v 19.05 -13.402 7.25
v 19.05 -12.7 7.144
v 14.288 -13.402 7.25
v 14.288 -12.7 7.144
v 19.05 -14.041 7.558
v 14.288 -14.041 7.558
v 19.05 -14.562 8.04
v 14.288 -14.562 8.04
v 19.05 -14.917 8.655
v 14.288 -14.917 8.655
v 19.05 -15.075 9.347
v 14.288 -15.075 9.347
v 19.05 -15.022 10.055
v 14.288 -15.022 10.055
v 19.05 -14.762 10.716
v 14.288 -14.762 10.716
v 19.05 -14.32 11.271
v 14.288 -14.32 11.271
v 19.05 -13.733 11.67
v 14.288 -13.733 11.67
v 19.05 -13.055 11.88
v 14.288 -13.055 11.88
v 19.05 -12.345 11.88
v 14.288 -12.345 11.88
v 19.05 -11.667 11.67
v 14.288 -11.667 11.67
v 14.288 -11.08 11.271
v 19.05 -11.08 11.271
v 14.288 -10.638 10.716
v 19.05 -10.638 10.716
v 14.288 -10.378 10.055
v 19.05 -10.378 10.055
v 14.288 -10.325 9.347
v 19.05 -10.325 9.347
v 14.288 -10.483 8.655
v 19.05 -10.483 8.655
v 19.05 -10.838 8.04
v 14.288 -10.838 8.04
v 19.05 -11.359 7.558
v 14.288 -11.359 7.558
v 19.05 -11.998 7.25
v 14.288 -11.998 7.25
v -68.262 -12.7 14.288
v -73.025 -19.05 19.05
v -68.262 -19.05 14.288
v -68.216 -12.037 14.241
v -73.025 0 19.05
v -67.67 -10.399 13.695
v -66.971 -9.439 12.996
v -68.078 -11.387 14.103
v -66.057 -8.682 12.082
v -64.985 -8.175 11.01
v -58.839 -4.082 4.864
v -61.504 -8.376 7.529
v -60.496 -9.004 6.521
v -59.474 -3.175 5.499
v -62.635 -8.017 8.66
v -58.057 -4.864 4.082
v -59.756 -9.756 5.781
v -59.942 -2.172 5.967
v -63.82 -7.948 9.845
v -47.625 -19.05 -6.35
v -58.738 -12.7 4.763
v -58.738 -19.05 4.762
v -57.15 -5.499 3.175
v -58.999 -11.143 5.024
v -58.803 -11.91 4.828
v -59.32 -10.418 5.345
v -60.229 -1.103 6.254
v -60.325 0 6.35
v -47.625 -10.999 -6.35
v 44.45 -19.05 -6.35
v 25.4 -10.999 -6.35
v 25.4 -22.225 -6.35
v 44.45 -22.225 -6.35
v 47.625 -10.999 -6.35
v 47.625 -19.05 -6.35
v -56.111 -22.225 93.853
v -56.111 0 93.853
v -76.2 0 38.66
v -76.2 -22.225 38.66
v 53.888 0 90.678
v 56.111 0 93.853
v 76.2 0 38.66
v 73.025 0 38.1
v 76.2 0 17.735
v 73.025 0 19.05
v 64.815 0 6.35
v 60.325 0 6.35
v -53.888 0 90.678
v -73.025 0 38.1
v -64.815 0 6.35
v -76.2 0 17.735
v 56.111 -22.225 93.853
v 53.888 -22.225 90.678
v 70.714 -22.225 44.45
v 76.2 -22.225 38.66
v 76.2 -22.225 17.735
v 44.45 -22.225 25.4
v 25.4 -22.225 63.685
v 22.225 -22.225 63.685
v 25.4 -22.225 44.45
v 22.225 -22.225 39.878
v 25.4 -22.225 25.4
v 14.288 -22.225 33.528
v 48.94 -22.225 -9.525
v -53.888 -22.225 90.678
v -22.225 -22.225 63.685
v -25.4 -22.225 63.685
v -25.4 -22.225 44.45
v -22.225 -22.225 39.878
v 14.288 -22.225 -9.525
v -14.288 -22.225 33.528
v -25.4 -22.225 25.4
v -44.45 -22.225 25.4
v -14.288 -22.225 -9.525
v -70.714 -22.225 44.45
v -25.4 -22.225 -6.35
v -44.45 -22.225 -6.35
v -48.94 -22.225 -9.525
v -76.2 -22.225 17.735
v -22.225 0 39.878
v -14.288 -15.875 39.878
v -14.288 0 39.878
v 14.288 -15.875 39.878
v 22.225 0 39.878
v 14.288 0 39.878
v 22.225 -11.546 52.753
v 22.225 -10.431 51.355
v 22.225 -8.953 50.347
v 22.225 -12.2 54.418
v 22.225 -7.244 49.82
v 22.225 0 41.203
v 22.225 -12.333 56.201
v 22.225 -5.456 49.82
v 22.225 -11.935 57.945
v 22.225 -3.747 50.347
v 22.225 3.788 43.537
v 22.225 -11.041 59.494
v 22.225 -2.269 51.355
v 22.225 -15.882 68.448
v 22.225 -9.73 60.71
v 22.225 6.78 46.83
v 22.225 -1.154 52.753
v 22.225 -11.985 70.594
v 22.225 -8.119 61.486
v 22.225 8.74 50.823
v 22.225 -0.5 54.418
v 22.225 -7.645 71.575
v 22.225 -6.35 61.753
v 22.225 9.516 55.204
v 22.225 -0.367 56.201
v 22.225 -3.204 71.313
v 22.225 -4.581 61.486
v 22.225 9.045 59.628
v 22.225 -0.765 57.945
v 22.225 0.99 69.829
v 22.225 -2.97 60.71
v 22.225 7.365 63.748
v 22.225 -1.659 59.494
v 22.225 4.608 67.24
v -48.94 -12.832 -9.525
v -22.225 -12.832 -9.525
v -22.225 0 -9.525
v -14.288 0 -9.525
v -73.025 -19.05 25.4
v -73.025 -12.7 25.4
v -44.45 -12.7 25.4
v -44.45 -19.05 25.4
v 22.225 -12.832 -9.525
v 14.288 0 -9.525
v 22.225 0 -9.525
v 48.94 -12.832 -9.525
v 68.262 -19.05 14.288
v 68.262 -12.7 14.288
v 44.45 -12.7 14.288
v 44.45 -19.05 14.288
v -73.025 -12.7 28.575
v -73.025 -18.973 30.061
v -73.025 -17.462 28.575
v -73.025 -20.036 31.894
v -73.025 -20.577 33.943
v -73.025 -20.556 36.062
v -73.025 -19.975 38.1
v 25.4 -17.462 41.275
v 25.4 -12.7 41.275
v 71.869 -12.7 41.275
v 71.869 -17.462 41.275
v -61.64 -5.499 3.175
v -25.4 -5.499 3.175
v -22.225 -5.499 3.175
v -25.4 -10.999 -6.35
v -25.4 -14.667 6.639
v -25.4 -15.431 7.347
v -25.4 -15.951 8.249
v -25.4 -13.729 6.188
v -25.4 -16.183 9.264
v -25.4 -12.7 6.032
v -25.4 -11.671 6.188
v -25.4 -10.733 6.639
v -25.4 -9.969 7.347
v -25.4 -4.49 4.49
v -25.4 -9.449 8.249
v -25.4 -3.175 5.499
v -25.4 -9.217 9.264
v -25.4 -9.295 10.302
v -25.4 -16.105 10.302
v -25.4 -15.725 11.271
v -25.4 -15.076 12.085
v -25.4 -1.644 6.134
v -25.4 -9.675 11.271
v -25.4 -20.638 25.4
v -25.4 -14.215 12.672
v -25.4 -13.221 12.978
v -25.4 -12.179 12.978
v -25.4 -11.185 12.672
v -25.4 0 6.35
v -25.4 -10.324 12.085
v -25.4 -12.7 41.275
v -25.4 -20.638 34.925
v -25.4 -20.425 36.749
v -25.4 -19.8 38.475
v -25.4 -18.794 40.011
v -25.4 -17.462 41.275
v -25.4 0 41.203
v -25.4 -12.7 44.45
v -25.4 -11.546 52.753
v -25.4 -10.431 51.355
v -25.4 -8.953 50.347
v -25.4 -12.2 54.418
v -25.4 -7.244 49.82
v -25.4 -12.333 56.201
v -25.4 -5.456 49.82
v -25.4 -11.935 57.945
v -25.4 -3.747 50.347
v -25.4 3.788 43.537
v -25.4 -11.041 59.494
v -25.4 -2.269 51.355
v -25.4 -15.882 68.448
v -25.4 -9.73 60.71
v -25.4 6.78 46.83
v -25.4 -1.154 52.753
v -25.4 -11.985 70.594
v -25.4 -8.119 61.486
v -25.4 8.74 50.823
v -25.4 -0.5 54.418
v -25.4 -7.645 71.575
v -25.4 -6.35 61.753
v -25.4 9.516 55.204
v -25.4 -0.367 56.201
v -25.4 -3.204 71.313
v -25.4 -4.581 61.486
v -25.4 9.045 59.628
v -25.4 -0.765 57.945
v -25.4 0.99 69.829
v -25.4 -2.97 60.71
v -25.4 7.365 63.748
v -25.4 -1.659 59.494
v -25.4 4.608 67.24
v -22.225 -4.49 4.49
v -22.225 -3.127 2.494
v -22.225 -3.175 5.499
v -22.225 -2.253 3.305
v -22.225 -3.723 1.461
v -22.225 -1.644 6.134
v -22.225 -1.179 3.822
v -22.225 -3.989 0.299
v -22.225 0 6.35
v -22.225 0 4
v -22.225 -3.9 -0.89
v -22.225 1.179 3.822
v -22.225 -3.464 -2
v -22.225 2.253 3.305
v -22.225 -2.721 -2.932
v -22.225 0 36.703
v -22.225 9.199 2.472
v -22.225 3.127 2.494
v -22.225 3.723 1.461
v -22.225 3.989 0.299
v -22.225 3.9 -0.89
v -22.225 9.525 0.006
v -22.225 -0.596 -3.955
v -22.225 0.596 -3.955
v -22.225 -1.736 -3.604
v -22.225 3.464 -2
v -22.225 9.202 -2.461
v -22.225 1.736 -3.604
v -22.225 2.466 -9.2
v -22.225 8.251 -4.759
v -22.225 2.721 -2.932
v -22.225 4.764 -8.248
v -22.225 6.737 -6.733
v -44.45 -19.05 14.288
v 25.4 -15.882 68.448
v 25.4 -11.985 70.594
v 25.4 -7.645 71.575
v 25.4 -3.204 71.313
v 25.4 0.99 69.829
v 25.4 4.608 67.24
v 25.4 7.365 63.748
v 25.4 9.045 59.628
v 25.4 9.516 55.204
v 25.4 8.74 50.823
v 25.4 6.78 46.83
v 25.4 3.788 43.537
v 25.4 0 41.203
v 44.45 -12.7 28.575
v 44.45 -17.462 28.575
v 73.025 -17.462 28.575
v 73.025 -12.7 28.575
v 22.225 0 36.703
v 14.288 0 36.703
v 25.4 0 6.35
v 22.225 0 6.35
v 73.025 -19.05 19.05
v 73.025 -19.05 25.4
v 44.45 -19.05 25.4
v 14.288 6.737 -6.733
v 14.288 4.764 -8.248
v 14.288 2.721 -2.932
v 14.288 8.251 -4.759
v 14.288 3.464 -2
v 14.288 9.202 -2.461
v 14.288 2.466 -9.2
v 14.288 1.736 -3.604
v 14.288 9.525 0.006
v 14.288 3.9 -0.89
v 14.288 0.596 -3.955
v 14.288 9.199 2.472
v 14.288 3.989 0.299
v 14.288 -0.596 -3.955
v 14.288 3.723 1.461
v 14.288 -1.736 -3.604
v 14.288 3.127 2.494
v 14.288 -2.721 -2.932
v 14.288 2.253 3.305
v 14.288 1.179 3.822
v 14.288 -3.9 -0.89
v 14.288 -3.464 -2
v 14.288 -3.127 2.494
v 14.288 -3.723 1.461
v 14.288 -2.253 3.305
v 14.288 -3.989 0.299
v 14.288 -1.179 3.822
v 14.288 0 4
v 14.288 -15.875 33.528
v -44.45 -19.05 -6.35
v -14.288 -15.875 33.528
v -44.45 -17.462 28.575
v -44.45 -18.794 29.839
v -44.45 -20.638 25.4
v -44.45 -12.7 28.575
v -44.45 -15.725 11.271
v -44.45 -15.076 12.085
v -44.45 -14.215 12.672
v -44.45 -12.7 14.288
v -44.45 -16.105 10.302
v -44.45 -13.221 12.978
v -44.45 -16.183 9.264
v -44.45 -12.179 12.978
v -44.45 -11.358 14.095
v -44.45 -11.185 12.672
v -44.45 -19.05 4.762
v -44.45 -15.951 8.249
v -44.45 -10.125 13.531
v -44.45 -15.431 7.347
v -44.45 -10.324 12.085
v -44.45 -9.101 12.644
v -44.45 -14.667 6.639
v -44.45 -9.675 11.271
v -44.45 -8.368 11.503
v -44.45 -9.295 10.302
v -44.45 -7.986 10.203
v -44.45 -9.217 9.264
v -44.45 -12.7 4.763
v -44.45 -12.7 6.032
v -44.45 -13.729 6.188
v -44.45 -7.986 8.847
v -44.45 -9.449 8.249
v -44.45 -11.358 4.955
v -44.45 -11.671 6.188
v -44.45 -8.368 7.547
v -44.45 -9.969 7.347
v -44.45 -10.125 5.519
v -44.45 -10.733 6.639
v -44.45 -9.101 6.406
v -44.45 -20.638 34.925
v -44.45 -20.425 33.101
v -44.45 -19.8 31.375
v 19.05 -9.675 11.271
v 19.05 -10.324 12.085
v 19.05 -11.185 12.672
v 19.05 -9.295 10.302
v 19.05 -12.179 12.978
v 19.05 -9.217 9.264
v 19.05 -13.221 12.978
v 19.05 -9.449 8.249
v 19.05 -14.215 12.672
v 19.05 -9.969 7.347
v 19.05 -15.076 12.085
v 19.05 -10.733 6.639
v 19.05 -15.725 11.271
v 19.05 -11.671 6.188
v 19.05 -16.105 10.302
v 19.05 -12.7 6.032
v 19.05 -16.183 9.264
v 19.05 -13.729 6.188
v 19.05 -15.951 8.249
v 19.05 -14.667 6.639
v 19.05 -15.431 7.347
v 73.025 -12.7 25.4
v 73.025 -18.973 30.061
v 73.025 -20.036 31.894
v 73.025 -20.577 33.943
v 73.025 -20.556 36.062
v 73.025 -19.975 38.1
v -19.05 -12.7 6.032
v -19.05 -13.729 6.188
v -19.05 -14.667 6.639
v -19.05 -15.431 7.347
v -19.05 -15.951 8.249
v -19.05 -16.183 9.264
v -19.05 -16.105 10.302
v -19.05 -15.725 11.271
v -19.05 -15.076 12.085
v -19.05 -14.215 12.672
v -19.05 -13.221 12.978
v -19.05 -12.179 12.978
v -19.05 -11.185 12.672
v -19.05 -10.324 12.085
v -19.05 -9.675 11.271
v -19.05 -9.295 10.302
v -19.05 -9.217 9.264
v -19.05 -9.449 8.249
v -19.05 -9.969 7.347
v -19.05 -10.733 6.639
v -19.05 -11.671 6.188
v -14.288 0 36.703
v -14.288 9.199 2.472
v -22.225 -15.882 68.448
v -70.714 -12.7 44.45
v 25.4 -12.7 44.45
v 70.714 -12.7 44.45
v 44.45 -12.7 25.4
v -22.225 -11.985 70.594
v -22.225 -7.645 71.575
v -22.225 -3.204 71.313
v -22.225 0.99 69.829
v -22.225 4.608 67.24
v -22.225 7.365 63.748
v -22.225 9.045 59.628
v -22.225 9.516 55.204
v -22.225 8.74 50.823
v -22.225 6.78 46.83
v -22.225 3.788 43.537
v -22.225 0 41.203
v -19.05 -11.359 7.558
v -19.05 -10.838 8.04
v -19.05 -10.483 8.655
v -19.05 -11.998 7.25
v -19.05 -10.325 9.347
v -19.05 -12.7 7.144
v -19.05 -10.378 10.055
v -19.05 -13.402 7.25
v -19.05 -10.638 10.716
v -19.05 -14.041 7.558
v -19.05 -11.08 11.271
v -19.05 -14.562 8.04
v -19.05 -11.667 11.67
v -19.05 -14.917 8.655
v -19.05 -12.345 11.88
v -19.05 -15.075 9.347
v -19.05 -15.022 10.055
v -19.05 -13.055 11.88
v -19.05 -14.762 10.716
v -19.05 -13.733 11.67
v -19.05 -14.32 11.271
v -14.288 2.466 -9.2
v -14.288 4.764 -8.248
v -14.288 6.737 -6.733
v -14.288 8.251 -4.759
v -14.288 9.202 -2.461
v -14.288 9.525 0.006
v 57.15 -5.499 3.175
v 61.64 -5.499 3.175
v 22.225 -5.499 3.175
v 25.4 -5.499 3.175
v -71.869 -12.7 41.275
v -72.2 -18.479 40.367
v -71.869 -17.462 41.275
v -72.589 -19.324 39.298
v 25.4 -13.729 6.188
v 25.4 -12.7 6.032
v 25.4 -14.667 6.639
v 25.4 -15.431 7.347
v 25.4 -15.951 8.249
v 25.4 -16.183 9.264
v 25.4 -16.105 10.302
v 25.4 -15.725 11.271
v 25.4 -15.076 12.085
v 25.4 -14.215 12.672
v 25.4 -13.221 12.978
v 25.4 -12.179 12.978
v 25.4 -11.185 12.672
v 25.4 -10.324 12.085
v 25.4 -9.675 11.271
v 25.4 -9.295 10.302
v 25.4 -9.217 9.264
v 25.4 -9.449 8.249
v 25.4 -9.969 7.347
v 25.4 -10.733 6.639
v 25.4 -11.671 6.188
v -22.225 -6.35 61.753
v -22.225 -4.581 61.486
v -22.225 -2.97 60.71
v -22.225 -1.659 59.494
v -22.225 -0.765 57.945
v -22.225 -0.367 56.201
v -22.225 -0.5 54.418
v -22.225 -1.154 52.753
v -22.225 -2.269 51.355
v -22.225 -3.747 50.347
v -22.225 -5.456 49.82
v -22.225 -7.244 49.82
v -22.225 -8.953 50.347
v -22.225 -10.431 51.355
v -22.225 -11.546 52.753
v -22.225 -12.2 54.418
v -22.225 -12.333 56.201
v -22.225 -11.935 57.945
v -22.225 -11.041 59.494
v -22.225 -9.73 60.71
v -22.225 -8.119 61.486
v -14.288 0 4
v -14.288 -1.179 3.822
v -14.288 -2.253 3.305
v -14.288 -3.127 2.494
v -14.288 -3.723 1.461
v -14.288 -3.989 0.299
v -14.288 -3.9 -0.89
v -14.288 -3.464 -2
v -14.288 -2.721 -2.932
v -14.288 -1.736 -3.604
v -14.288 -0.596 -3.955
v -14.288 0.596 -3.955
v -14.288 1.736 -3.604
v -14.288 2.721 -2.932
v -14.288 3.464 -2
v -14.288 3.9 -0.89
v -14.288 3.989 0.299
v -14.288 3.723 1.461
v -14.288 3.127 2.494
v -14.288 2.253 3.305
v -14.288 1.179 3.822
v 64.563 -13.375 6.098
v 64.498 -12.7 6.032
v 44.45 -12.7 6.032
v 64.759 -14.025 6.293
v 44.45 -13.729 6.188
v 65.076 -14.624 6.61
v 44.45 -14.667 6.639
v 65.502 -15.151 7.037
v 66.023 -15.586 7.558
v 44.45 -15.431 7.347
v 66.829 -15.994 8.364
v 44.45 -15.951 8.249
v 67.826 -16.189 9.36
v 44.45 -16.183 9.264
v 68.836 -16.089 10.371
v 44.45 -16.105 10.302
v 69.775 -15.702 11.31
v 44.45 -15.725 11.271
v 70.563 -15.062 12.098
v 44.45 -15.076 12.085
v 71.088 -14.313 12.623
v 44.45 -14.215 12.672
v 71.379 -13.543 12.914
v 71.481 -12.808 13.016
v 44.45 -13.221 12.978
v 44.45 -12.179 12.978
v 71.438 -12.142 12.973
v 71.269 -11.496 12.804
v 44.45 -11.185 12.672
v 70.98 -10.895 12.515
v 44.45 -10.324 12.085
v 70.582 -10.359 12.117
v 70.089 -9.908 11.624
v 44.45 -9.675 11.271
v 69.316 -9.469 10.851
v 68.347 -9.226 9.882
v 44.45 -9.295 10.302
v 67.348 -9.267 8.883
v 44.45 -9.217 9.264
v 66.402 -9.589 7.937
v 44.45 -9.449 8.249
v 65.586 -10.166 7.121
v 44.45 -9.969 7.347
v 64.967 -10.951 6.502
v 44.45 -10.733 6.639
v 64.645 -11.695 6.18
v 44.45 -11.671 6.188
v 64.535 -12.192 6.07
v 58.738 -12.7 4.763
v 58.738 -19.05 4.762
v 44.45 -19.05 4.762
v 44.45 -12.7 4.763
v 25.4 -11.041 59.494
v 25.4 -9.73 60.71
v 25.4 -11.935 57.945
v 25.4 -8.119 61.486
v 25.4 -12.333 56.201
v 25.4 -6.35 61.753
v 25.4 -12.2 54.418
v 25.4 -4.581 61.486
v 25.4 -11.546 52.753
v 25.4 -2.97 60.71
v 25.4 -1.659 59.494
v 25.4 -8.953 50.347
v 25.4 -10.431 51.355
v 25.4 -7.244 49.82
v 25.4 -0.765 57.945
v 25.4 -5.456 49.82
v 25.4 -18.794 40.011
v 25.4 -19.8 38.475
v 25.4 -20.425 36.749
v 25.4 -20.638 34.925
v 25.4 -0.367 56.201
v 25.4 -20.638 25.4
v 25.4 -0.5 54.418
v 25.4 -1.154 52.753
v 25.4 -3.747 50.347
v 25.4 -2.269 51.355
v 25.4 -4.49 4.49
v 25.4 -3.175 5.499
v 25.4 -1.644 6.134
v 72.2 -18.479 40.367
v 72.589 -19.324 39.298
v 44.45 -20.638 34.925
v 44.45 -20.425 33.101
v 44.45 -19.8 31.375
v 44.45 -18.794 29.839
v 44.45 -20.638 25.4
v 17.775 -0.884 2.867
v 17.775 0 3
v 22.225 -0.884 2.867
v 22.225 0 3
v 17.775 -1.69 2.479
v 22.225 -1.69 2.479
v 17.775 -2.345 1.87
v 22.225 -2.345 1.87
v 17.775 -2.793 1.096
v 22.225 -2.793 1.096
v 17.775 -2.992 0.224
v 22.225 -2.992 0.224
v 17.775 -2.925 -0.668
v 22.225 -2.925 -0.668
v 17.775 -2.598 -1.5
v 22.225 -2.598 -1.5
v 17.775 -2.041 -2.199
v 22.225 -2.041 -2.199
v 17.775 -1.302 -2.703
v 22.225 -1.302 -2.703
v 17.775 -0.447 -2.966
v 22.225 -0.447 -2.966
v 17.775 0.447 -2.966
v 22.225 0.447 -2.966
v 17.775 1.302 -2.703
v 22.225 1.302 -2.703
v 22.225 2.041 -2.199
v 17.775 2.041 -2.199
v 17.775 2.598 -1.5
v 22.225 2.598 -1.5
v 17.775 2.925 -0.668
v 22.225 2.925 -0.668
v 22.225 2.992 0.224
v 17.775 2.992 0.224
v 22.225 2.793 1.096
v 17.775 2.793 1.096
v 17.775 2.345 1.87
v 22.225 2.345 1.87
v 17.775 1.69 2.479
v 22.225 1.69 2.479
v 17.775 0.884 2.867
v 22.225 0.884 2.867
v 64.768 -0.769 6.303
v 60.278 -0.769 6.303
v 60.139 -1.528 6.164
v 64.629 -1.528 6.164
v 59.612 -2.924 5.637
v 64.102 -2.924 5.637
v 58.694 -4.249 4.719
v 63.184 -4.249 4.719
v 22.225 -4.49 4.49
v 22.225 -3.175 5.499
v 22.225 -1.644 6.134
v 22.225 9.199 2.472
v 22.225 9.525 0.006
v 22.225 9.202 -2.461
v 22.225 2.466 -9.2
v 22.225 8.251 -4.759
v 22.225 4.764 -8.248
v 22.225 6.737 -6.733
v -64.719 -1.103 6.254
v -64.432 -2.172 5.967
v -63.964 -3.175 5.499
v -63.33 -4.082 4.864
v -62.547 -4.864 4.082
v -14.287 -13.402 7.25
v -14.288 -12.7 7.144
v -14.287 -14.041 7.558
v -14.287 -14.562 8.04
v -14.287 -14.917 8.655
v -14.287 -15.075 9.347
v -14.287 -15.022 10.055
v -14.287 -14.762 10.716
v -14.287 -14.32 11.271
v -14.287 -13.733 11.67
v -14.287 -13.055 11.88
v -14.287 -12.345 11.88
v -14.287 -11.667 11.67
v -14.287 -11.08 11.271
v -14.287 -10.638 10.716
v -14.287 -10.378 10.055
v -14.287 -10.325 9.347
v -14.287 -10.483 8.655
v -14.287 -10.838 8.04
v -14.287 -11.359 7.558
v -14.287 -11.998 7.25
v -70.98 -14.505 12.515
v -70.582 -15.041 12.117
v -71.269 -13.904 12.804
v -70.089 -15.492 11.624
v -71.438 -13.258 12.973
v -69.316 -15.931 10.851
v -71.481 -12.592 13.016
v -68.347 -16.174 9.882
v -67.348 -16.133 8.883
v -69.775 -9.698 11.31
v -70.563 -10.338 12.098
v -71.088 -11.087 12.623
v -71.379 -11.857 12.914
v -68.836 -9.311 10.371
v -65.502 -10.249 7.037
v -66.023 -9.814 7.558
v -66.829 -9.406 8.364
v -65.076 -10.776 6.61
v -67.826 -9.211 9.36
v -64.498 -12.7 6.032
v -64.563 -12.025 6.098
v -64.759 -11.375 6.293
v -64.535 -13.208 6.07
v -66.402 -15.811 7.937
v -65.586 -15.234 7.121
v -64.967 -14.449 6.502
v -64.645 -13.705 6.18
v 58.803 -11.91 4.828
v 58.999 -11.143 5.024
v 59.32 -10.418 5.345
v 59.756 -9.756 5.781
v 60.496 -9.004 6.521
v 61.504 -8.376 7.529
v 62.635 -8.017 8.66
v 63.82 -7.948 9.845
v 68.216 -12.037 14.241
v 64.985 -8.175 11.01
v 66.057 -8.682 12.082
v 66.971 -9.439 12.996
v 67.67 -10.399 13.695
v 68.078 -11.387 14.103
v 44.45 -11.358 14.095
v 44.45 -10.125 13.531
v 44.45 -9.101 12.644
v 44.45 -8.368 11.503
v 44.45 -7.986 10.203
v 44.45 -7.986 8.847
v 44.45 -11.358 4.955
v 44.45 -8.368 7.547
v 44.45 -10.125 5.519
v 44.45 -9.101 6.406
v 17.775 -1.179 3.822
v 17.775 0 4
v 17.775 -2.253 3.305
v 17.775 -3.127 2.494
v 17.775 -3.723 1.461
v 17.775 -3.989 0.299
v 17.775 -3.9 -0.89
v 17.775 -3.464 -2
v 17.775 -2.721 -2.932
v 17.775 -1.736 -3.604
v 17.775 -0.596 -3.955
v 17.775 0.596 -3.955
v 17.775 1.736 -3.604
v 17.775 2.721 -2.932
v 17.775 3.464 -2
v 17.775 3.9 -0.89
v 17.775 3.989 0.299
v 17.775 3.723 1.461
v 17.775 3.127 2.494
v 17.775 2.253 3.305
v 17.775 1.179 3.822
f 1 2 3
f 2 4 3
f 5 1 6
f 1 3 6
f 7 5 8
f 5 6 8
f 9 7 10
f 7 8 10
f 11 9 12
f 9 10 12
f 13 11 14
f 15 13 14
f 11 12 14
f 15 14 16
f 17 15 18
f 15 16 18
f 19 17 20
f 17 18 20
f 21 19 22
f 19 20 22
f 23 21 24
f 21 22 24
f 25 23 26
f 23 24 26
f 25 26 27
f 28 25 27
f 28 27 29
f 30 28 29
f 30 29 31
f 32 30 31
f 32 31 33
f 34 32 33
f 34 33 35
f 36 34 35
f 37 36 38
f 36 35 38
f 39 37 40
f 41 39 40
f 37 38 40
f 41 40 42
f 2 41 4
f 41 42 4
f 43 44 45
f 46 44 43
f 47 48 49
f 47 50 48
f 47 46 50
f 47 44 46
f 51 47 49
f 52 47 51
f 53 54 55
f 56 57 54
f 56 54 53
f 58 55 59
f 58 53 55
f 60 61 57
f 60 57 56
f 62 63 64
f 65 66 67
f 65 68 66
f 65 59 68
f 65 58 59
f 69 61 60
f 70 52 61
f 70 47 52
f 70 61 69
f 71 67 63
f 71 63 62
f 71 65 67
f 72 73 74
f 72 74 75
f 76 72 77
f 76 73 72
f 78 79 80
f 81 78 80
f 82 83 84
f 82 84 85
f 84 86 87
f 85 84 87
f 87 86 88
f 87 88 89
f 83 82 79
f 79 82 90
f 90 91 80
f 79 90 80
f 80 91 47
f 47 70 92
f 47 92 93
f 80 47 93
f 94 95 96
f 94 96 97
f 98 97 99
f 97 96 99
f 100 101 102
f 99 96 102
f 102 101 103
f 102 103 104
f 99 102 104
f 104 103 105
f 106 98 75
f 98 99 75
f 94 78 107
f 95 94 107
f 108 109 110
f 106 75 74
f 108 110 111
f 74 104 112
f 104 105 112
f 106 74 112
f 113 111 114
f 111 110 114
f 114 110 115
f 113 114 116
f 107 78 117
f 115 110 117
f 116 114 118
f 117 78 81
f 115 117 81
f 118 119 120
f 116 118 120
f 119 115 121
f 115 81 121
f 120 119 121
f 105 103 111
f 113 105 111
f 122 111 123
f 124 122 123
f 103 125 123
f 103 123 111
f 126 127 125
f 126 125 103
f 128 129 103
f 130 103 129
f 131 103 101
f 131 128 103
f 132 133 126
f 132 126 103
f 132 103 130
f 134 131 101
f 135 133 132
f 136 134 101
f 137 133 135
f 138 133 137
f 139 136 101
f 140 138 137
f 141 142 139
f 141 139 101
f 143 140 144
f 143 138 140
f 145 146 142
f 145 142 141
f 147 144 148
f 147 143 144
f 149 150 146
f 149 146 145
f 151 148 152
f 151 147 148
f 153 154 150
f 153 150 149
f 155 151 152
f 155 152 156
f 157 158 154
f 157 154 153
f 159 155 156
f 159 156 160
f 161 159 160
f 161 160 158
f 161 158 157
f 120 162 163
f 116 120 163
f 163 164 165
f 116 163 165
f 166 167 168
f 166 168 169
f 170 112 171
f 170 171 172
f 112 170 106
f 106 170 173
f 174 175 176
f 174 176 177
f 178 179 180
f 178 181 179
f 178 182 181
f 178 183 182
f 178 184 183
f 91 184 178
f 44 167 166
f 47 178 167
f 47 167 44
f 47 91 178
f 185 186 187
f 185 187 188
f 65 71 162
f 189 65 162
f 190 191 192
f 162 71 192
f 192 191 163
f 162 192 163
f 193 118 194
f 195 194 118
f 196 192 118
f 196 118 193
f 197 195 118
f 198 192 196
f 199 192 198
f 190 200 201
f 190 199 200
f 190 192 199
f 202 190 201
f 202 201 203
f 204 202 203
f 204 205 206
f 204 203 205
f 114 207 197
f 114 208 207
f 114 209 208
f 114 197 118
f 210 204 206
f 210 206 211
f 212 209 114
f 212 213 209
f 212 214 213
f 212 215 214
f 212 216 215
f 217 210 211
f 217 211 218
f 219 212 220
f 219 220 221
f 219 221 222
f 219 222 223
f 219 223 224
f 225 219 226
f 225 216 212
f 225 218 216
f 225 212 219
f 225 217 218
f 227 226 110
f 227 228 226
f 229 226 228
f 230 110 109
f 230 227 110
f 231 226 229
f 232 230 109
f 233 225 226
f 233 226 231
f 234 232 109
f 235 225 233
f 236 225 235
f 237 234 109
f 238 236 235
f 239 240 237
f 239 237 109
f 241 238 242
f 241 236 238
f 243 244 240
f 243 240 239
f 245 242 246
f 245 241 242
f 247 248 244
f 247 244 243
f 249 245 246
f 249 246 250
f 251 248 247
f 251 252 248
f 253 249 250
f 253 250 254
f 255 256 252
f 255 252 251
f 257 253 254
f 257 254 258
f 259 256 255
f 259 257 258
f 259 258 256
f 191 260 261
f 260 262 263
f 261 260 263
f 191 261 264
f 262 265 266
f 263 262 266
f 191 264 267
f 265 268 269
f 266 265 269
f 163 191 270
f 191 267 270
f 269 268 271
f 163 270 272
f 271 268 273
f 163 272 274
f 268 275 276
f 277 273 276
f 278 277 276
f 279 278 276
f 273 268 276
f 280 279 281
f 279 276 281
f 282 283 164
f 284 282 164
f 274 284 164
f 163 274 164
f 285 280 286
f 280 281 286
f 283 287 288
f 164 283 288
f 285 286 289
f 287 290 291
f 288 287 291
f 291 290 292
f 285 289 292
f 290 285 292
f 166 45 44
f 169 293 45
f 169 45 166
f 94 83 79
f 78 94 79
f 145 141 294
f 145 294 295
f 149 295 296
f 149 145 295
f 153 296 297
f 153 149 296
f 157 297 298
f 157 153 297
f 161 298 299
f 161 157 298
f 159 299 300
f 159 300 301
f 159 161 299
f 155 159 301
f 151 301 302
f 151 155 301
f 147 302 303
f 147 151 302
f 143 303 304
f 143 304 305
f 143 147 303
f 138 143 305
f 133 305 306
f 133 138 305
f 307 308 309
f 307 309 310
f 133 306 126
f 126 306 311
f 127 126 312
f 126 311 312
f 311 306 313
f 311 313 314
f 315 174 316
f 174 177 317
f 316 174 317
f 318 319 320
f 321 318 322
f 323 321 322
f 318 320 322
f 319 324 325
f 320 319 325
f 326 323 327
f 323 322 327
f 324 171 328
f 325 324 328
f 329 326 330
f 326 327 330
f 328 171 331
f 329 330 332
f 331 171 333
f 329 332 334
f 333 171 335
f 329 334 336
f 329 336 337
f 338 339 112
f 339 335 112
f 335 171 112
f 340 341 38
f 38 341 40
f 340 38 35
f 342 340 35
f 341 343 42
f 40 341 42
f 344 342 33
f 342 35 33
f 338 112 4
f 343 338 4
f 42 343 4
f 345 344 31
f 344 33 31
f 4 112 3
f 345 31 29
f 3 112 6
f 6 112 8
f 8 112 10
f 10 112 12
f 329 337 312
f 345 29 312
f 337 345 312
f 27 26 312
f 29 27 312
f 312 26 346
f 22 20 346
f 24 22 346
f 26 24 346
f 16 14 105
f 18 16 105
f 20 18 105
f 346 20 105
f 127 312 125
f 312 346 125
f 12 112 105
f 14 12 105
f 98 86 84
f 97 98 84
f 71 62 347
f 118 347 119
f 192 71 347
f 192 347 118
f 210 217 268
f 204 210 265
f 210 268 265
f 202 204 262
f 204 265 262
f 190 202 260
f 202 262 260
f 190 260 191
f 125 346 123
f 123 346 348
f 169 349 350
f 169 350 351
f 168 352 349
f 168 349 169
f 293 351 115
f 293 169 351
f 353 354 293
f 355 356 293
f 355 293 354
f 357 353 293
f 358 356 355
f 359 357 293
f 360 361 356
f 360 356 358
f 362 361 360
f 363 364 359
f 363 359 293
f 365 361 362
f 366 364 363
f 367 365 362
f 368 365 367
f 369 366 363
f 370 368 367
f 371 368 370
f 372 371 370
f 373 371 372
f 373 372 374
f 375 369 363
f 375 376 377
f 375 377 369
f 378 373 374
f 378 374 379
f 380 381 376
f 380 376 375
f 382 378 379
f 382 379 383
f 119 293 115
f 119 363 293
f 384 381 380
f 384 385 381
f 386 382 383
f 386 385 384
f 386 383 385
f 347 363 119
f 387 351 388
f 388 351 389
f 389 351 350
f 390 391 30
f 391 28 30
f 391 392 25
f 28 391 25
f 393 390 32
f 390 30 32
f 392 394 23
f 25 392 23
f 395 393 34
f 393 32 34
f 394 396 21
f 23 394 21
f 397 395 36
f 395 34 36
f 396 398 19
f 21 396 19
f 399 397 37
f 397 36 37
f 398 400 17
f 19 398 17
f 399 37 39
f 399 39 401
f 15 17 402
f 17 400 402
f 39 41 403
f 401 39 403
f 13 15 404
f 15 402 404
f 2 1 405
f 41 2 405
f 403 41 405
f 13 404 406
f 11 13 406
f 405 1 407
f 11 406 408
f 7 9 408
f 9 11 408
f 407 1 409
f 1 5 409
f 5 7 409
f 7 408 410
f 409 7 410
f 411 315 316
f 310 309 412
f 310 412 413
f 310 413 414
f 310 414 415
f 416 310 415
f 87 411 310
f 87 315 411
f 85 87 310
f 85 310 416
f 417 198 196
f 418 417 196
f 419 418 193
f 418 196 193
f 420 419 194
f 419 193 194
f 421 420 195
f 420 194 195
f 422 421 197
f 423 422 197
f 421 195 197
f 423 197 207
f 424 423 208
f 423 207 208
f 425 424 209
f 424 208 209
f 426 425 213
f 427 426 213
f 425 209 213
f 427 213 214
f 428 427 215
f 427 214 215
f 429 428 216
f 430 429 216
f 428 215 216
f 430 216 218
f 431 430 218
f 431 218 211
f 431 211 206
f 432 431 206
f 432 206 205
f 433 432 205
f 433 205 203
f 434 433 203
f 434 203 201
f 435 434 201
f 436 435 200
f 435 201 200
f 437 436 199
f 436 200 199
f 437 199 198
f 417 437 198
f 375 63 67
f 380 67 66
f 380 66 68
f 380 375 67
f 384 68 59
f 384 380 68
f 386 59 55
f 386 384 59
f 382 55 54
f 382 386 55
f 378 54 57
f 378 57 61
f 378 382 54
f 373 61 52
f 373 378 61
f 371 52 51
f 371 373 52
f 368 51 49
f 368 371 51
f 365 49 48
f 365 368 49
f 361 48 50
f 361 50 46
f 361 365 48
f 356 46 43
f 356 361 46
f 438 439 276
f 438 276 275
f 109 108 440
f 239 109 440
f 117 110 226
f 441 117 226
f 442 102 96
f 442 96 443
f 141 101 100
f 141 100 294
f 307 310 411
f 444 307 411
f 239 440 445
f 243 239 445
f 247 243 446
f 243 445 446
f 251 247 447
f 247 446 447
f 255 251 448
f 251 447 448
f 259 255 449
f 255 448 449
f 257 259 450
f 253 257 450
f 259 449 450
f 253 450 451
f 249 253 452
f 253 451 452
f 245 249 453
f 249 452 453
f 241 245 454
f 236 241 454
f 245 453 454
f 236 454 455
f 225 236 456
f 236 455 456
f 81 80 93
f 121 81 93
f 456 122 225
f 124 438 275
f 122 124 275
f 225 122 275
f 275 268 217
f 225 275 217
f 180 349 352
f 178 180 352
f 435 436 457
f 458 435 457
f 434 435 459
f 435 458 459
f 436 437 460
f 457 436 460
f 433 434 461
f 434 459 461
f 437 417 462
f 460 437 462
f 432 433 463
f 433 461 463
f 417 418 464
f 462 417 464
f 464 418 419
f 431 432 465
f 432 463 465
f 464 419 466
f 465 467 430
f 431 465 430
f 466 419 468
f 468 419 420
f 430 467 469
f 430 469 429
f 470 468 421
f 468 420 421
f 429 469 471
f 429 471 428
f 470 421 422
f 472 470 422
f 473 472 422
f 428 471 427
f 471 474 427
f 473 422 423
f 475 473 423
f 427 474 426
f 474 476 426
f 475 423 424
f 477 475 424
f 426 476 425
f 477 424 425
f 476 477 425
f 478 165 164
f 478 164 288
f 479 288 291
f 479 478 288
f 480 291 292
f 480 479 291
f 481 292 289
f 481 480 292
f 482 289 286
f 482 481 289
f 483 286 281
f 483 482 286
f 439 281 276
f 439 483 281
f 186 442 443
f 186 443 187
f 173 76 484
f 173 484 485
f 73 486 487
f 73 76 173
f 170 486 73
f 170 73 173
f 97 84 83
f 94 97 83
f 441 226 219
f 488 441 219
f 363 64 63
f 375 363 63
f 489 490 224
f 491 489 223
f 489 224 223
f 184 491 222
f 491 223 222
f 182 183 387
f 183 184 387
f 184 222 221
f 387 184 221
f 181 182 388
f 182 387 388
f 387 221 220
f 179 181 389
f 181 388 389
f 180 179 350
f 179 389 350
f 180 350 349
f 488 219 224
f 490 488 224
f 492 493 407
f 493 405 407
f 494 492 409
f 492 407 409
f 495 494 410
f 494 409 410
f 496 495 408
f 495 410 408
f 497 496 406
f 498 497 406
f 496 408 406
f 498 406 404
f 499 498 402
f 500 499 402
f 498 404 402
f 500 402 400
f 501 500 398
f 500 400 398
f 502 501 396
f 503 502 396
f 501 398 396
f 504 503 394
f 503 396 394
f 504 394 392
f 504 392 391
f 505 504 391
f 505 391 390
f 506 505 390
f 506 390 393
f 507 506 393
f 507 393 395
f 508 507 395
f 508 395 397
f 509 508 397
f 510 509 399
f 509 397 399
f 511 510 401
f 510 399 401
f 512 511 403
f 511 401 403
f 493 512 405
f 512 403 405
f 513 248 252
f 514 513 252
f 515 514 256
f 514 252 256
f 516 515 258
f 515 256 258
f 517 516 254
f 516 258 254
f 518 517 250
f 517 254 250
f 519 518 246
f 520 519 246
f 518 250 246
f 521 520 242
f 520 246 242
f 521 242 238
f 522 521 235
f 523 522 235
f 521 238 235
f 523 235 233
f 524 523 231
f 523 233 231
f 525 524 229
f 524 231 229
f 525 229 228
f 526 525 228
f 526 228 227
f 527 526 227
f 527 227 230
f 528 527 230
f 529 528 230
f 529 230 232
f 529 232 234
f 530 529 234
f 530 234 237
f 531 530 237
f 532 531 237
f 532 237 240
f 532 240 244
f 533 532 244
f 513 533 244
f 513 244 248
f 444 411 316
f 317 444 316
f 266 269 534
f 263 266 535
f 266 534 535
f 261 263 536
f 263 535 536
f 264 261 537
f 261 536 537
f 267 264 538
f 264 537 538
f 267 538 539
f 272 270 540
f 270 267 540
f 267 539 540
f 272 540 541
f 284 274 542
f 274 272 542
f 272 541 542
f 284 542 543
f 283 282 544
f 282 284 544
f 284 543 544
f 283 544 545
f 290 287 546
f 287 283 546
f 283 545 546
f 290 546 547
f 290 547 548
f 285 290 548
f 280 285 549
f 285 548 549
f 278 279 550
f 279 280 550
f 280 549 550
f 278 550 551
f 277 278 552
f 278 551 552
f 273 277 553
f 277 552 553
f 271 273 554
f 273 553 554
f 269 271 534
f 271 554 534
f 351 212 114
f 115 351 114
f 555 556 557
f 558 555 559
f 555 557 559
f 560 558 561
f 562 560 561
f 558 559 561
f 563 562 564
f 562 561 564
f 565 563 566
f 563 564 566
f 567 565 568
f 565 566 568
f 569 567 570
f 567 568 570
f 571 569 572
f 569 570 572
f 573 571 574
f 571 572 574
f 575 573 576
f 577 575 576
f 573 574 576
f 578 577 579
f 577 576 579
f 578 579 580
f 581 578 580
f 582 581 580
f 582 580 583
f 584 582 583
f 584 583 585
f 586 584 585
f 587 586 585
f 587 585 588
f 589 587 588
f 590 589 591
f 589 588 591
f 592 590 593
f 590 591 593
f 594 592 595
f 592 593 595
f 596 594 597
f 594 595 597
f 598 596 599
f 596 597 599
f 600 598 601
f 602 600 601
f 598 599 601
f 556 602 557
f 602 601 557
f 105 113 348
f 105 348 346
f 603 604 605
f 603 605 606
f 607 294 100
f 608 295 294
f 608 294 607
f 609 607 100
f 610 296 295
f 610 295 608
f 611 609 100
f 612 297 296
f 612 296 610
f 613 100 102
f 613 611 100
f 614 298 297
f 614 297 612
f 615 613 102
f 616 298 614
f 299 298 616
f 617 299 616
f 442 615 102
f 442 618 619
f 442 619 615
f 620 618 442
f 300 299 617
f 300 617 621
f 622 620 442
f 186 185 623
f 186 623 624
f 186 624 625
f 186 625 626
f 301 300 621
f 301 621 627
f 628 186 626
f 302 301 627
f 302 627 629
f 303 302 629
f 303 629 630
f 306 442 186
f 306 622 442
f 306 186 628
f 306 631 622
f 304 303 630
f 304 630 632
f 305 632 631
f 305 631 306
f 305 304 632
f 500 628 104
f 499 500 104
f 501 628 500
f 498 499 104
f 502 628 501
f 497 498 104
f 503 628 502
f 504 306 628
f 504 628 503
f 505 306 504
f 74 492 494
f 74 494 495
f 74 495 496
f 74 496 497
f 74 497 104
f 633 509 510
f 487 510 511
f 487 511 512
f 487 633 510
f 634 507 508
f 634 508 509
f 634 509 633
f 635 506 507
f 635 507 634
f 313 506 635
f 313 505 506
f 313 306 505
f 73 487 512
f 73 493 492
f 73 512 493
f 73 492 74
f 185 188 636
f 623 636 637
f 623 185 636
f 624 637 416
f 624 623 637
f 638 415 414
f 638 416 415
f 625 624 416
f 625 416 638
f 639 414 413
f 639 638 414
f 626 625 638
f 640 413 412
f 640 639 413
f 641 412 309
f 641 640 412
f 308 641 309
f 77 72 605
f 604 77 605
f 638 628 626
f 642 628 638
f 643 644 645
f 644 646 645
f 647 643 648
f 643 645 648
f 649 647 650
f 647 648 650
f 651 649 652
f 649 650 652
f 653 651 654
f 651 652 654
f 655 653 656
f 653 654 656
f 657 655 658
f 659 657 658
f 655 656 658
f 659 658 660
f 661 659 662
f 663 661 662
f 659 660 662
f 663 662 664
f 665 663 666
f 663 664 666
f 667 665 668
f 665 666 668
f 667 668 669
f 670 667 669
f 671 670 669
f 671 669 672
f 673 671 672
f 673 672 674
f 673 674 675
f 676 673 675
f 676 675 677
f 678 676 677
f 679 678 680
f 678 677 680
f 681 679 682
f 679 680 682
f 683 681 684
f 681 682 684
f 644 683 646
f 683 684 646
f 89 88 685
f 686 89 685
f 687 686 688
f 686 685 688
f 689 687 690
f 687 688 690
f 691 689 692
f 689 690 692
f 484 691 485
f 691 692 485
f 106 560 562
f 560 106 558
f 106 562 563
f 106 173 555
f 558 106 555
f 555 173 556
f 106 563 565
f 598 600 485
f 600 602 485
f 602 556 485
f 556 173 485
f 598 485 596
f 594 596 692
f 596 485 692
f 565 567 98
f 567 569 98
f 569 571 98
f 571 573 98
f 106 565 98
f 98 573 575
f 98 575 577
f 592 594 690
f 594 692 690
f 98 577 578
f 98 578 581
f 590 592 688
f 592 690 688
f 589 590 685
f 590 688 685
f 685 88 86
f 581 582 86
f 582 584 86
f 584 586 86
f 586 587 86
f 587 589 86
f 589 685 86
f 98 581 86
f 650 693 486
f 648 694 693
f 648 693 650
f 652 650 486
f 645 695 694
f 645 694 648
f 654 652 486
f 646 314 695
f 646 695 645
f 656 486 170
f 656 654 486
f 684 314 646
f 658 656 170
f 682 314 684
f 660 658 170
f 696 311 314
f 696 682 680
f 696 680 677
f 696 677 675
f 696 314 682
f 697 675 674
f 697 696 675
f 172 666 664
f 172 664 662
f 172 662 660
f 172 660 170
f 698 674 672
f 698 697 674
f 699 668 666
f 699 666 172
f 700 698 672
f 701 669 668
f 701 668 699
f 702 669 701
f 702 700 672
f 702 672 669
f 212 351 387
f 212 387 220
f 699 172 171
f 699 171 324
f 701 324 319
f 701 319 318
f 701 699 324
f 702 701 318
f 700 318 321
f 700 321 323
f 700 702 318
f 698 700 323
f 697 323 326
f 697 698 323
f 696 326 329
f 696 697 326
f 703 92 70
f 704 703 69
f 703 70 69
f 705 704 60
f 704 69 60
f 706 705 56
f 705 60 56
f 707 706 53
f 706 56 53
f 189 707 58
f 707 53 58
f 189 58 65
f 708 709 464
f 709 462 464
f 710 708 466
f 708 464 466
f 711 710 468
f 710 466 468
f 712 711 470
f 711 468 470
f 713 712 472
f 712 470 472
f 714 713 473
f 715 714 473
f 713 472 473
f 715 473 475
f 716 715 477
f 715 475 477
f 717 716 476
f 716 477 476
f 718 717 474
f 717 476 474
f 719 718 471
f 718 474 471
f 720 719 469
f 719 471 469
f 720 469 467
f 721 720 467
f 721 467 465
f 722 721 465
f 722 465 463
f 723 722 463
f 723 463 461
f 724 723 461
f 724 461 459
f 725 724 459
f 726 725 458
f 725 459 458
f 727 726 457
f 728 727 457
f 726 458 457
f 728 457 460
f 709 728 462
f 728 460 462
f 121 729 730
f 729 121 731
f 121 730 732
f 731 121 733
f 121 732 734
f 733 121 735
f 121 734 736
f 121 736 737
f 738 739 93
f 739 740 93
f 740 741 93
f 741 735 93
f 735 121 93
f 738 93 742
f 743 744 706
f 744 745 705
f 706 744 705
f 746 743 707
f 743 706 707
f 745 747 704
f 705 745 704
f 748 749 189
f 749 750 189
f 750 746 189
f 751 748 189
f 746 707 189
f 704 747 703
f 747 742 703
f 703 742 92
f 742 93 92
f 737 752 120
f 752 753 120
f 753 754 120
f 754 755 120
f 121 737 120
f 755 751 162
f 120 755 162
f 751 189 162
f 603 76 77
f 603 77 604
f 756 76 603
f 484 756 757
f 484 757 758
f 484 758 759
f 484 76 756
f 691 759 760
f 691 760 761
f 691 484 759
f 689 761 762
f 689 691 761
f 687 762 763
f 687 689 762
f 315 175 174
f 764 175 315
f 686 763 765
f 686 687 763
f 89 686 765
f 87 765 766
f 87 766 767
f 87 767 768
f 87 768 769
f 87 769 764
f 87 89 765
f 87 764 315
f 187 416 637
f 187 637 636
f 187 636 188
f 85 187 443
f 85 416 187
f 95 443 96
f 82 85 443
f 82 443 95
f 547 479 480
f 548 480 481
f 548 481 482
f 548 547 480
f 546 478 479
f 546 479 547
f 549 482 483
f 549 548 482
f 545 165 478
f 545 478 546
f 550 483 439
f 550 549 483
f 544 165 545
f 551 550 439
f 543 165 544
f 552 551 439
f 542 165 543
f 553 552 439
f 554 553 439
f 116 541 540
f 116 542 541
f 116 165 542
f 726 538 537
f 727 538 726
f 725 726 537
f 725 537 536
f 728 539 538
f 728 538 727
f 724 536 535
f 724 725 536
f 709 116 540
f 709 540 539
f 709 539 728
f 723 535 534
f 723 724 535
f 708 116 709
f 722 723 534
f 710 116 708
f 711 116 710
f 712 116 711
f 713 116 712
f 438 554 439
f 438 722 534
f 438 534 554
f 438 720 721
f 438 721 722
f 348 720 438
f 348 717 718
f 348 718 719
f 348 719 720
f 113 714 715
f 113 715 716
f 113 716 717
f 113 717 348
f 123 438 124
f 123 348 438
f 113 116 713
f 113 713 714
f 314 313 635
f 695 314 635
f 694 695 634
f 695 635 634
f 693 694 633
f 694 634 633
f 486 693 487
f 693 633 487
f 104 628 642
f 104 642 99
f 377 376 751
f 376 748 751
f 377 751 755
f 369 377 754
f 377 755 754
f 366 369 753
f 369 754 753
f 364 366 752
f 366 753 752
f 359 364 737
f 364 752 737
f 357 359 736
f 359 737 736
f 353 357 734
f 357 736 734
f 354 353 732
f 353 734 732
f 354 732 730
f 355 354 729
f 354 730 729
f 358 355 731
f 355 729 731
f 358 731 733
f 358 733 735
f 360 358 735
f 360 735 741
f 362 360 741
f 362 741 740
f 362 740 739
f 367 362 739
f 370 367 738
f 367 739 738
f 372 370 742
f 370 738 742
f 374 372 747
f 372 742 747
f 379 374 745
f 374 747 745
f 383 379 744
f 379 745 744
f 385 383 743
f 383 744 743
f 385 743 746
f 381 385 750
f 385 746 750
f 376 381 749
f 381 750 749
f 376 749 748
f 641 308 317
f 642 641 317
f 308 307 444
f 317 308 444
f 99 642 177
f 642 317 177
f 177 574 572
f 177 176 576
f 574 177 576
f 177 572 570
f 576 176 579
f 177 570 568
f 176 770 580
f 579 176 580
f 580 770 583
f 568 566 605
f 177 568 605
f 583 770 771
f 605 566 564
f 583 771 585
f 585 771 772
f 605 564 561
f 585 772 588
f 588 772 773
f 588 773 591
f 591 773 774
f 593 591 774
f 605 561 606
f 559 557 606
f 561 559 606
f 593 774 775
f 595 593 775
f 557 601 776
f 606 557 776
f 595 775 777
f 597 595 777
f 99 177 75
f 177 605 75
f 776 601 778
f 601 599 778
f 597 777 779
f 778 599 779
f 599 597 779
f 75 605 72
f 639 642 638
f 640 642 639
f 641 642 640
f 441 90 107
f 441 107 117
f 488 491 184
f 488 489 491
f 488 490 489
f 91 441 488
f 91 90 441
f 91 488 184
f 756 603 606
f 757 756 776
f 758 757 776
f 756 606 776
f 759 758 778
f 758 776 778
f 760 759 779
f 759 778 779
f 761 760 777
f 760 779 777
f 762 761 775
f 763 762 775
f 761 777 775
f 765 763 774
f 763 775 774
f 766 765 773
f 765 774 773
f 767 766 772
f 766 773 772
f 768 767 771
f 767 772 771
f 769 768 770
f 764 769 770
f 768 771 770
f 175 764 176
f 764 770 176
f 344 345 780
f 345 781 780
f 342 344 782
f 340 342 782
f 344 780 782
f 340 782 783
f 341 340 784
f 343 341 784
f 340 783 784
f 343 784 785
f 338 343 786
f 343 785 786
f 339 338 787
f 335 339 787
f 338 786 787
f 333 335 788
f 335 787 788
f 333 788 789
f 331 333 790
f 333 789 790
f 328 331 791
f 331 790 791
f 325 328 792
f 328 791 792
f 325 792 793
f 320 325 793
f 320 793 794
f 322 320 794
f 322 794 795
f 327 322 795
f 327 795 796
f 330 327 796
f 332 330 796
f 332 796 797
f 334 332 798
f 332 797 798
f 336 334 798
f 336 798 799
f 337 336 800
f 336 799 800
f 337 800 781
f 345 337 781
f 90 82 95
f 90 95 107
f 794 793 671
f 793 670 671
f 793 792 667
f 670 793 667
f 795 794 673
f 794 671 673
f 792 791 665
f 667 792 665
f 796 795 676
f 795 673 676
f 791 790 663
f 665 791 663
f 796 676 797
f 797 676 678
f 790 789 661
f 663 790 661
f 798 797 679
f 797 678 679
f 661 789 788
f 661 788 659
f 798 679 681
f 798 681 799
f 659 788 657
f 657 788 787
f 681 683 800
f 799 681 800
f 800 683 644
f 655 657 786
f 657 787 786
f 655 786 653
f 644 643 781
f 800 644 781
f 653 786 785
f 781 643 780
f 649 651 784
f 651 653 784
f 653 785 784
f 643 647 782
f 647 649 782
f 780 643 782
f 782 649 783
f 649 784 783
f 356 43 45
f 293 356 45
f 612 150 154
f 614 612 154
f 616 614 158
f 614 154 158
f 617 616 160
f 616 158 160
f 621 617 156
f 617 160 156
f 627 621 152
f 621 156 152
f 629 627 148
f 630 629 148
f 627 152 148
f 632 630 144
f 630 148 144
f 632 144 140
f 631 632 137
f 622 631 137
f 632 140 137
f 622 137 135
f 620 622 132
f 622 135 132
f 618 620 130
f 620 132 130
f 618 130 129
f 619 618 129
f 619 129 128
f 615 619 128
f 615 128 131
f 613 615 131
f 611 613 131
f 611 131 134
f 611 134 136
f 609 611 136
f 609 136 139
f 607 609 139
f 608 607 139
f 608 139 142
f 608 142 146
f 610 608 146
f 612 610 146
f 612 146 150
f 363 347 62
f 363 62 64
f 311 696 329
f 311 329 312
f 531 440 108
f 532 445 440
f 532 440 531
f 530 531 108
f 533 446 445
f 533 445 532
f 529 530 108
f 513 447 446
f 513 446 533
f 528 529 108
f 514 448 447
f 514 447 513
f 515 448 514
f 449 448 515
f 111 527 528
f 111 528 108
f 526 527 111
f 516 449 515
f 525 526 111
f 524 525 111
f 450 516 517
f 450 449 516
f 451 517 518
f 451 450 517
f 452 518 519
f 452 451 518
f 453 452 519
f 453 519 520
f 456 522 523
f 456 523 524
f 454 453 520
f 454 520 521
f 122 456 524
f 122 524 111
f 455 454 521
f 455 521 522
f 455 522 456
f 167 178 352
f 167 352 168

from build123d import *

# Parameters (mm, degrees)
BOSS_EXTRUDE1_DEPTH = 22.225
BOSS_EXTRUDE2_DEPTH = 22.225
SKETCH4_W           = 28.575
SKETCH4_H           = 43.053
CUT_EXTRUDE1_DEPTH  = 125.991552151
CUT_EXTRUDE4_REACH  = 101.697
SKETCH9_W           = 28.575
SKETCH9_H           = 16.728193257
BOSS_EXTRUDE3_REACH = 142.089
SKETCH11_W          = 19.05
SKETCH11_H          = 19.05
CUT_EXTRUDE5_DEPTH  = 7.9375
BOSS_EXTRUDE6_REACH = 156.463
BOSS_EXTRUDE4_DEPTH = 3.175
CUT_EXTRUDE6_REACH  = 142.089
SKETCH19_R          = 6
CUT_EXTRUDE7_DEPTH  = 138.803544436


with BuildPart() as part:
    # Sketch1 → Boss-Extrude1 (new, symmetric)
    with BuildSketch(Plane(origin=(0, 0, 0), x_dir=(0, 0, -1), z_dir=(1, 0, 0))):
        with BuildLine():
            Line((9.525, -22.225), (9.525, 0))
            ThreePointArc((9.525, 0), (5.795727419, 7.558780899), (-2.471885813, 9.198663247))
            Line((-2.471885813, 9.198663247), (-36.703, 0))
            Line((-36.703, 0), (-36.703, -22.225))
            Line((-36.703, -22.225), (9.525, -22.225))
        make_face()
    extrude(amount=BOSS_EXTRUDE1_DEPTH, both=True)

    # Sketch3 → Boss-Extrude2 (add)
    with BuildSketch(Plane(origin=(0, 0, 0), x_dir=(-1, 0, 0), z_dir=(0, -1, 0))):
        Polygon((22.225, 9.525), (22.225, -36.703), (-22.225, -36.703), (-22.225, 9.525), (-48.940128061, 9.525), (-76.2, -17.734871939), (-76.2, -38.659838164), (-56.111331957, -93.853), (56.111331957, -93.853), (76.2, -38.659838164), (76.2, -17.734871939), (48.940128061, 9.525), align=None)
        Polygon((73.025, -19.05), (47.625, 6.35), (25.4, 6.35), (25.4, -49.403), (22.225, -49.403), (22.225, -39.878), (-22.225, -39.878), (-22.225, -49.403), (-25.4, -49.403), (-25.4, 6.35), (-47.625, 6.35), (-73.025, -19.05), (-73.025, -38.1), (-53.888173023, -90.678), (53.888173023, -90.678), (73.025, -38.1), align=None, mode=Mode.SUBTRACT)
    extrude(amount=BOSS_EXTRUDE2_DEPTH)

    # Sketch4 → Cut-Extrude1 (cut, through all)
    with BuildSketch(Plane.XZ.offset(22.225)):
        with Locations((0, 12.0015)):
            Rectangle(SKETCH4_W, SKETCH4_H)
    extrude(amount=-CUT_EXTRUDE1_DEPTH, mode=Mode.SUBTRACT)

    # Sketch6 → Cut-Revolve1 (revolve, cut)
    with BuildSketch(Plane(origin=(0, 0, 0), x_dir=(1, 0, 0), z_dir=(0, 1, 0)), mode=Mode.PRIVATE) as cut_revolve1_sk:
        Polygon((-22.225, 4), (17.775, 4), (17.775, 3), (22.225, 3), (22.225, 6.35), (78.807413882, 6.35), (78.807413882, 0), (22.225, 0), (-22.225, 0), (-88.579385408, 0), (-88.579385408, 6.35), (-22.225, 6.35), align=None)
    revolve(cut_revolve1_sk.sketch.rotate(Axis((-22.225, 0, 0), (1, 0, 0)), 180), axis=Axis((-22.225, 0, 0), (1, 0, 0)), mode=Mode.SUBTRACT)

    # Sketch9 → Cut-Extrude4 (cut, up to next)
    with BuildSketch(Plane(origin=(0, 0, 33.528), x_dir=(-1, 0, 0), z_dir=(0, 0, -1)), mode=Mode.PRIVATE) as cut_extrude4_sk1:
        with Locations((0, -7.510903372)):
            Rectangle(SKETCH9_W, SKETCH9_H)
    cut_extrude4_tool1 = extrude(cut_extrude4_sk1.sketch, amount=-CUT_EXTRUDE4_REACH, mode=Mode.PRIVATE) & part.part
    add(cut_extrude4_tool1.solids().sort_by_distance((0, -7.510903, 33.528))[0], mode=Mode.SUBTRACT)

    # Sketch10 → Boss-Extrude3 (add, up to next)
    with BuildSketch(Plane(origin=(25.4, 0, 0), x_dir=(0, 0, -1), z_dir=(1, 0, 0)), mode=Mode.PRIVATE) as boss_extrude3_sk1:
        with BuildLine():
            Line((-28.575, -17.4625), (-28.575, -12.7))
            Line((-28.575, -12.7), (-25.4, -12.7))
            Line((-25.4, -12.7), (-25.4, -22.225))
            Line((-25.4, -22.225), (-44.45, -22.225))
            Line((-44.45, -22.225), (-44.45, -12.7))
            Line((-44.45, -12.7), (-41.275, -12.7))
            Line((-41.275, -12.7), (-41.275, -17.4625))
            ThreePointArc((-41.275, -17.4625), (-34.925, -20.6375), (-28.575, -17.4625))
        make_face()
    boss_extrude3_tool1 = extrude(boss_extrude3_sk1.sketch, amount=BOSS_EXTRUDE3_REACH, mode=Mode.PRIVATE) - part.part
    boss_extrude3 = boss_extrude3_tool1.solids().sort_by_distance((25.4, -15.08125, 28.362015))[0]
    add(boss_extrude3)

    # Mirror1: Boss-Extrude3 across plane
    add(boss_extrude3.mirror(Plane(origin=(0, 0, 0), x_dir=(0, 0, 1), z_dir=(1, 0, 0))))

    # Sketch11 → Cut-Extrude5 (cut)
    with BuildSketch(Plane(origin=(0, -12.7, 0), x_dir=(1, 0, 0), z_dir=(0, 1, 0))):
        with Locations((-34.925, -25.4)):
            Rectangle(SKETCH11_W, SKETCH11_H)
        with Locations((34.925, -25.4)):
            Rectangle(SKETCH11_W, SKETCH11_H)
    extrude(amount=-CUT_EXTRUDE5_DEPTH, mode=Mode.SUBTRACT)

    # Sketch18 → Boss-Extrude6 (add, up to next)
    with BuildSketch(Plane(origin=(-44.45, 0, 0), x_dir=(0, 0, -1), z_dir=(1, 0, 0)), mode=Mode.PRIVATE) as boss_extrude6_sk1:
        with BuildLine():
            Line((-25.4, -22.225), (6.35, -22.225))
            Line((6.35, -22.225), (6.35, -19.05))
            Line((6.35, -19.05), (-4.7625, -19.05))
            Line((-4.7625, -19.05), (-4.7625, -12.7))
            ThreePointArc((-4.7625, -12.7), (-9.525, -7.9375), (-14.2875, -12.7))
            Line((-14.2875, -12.7), (-14.2875, -19.05))
            Line((-14.2875, -19.05), (-25.4, -19.05))
            Line((-25.4, -19.05), (-25.4, -22.225))
        make_face()
    boss_extrude6_tool1 = extrude(boss_extrude6_sk1.sketch, amount=-BOSS_EXTRUDE6_REACH, mode=Mode.PRIVATE) - part.part
    boss_extrude6 = boss_extrude6_tool1.solids().sort_by_distance((-44.45, -17.372872, 9.525))[0]
    add(boss_extrude6)

    # Mirror3: Boss-Extrude6 across plane
    add(boss_extrude6.mirror(Plane(origin=(0, 0, 0), x_dir=(0, 0, 1), z_dir=(1, 0, 0))))

    # Sketch14 → Cut-Revolve2 (revolve, cut)
    with BuildSketch(Plane(origin=(0, -12.7, 0), x_dir=(-1, 0, 0), z_dir=(0, -1, 0))):
        Polygon((-73.701947692, -6.0325), (-19.05, -6.0325), (-19.05, -7.14375), (-14.2875, -7.14375), (-14.2875, -9.525), (-73.701947692, -9.525), align=None)
        Polygon((14.2875, -9.525), (14.2875, -7.14375), (19.05, -7.14375), (19.05, -6.0325), (73.701947692, -6.0325), (73.701947692, -9.525), align=None)
    revolve(axis=Axis((73.701947692, -12.7, 9.525), (-1, 0, 0)), mode=Mode.SUBTRACT)

    # Sketch15 → Boss-Extrude4 (add)
    with BuildSketch(Plane(origin=(-22.225, 0, 0), x_dir=(0, 0, -1), z_dir=(1, 0, 0))):
        with BuildLine():
            Line((-39.878, -22.225), (-63.685165738, -22.225))
            Line((-63.685165738, -22.225), (-68.447876585, -15.881827396))
            ThreePointArc((-68.447876585, -15.881827396), (-60.777164568, 8.708997158), (-39.878, -6.35))
            Line((-39.878, -6.35), (-39.878, -22.225))
        make_face()
    boss_extrude4 = extrude(amount=-BOSS_EXTRUDE4_DEPTH)

    # Mirror2: Boss-Extrude4 across plane
    add(boss_extrude4.mirror(Plane(origin=(0, 0, 0), x_dir=(0, 0, 1), z_dir=(1, 0, 0))))

    # Cut-Extrude6: up to this face of the body (flat: up to its plane)
    cut_extrude6_end = Plane(part.part.faces().sort_by_distance((25.4, -9.178544074, 35.806928902))[0])
    # Sketch19 → Cut-Extrude6 (cut, up to the picked face)
    with BuildSketch(Plane.ZY.offset(25.4), mode=Mode.PRIVATE) as cut_extrude6_sk1:
        with Locations((55.753, -6.35)):
            Circle(SKETCH19_R)
    cut_extrude6_tool1 = split(extrude(cut_extrude6_sk1.sketch, amount=-CUT_EXTRUDE6_REACH, mode=Mode.PRIVATE), bisect_by=cut_extrude6_end, keep=Keep.BOTH, mode=Mode.PRIVATE)
    add(cut_extrude6_tool1.solids().sort_by(Axis((-25.4, -6.35, 55.753), (1, 0, 0)))[0], mode=Mode.SUBTRACT)

    # Sketch20 → Cut-Extrude7 (cut, through all)
    with BuildSketch(Plane.ZY.offset(22.225)):
        Polygon((3.175, -5.499261314), (-9.525, -12.831609733), (-9.525, 0), (3.175, 0), align=None)
    cut_extrude7 = extrude(amount=CUT_EXTRUDE7_DEPTH, mode=Mode.SUBTRACT)

    # Mirror4: Cut-Extrude7 across plane
    add(cut_extrude7.mirror(Plane(origin=(0, 0, 0), x_dir=(0, 0, 1), z_dir=(1, 0, 0))), mode=Mode.SUBTRACT)


solid = part.part
